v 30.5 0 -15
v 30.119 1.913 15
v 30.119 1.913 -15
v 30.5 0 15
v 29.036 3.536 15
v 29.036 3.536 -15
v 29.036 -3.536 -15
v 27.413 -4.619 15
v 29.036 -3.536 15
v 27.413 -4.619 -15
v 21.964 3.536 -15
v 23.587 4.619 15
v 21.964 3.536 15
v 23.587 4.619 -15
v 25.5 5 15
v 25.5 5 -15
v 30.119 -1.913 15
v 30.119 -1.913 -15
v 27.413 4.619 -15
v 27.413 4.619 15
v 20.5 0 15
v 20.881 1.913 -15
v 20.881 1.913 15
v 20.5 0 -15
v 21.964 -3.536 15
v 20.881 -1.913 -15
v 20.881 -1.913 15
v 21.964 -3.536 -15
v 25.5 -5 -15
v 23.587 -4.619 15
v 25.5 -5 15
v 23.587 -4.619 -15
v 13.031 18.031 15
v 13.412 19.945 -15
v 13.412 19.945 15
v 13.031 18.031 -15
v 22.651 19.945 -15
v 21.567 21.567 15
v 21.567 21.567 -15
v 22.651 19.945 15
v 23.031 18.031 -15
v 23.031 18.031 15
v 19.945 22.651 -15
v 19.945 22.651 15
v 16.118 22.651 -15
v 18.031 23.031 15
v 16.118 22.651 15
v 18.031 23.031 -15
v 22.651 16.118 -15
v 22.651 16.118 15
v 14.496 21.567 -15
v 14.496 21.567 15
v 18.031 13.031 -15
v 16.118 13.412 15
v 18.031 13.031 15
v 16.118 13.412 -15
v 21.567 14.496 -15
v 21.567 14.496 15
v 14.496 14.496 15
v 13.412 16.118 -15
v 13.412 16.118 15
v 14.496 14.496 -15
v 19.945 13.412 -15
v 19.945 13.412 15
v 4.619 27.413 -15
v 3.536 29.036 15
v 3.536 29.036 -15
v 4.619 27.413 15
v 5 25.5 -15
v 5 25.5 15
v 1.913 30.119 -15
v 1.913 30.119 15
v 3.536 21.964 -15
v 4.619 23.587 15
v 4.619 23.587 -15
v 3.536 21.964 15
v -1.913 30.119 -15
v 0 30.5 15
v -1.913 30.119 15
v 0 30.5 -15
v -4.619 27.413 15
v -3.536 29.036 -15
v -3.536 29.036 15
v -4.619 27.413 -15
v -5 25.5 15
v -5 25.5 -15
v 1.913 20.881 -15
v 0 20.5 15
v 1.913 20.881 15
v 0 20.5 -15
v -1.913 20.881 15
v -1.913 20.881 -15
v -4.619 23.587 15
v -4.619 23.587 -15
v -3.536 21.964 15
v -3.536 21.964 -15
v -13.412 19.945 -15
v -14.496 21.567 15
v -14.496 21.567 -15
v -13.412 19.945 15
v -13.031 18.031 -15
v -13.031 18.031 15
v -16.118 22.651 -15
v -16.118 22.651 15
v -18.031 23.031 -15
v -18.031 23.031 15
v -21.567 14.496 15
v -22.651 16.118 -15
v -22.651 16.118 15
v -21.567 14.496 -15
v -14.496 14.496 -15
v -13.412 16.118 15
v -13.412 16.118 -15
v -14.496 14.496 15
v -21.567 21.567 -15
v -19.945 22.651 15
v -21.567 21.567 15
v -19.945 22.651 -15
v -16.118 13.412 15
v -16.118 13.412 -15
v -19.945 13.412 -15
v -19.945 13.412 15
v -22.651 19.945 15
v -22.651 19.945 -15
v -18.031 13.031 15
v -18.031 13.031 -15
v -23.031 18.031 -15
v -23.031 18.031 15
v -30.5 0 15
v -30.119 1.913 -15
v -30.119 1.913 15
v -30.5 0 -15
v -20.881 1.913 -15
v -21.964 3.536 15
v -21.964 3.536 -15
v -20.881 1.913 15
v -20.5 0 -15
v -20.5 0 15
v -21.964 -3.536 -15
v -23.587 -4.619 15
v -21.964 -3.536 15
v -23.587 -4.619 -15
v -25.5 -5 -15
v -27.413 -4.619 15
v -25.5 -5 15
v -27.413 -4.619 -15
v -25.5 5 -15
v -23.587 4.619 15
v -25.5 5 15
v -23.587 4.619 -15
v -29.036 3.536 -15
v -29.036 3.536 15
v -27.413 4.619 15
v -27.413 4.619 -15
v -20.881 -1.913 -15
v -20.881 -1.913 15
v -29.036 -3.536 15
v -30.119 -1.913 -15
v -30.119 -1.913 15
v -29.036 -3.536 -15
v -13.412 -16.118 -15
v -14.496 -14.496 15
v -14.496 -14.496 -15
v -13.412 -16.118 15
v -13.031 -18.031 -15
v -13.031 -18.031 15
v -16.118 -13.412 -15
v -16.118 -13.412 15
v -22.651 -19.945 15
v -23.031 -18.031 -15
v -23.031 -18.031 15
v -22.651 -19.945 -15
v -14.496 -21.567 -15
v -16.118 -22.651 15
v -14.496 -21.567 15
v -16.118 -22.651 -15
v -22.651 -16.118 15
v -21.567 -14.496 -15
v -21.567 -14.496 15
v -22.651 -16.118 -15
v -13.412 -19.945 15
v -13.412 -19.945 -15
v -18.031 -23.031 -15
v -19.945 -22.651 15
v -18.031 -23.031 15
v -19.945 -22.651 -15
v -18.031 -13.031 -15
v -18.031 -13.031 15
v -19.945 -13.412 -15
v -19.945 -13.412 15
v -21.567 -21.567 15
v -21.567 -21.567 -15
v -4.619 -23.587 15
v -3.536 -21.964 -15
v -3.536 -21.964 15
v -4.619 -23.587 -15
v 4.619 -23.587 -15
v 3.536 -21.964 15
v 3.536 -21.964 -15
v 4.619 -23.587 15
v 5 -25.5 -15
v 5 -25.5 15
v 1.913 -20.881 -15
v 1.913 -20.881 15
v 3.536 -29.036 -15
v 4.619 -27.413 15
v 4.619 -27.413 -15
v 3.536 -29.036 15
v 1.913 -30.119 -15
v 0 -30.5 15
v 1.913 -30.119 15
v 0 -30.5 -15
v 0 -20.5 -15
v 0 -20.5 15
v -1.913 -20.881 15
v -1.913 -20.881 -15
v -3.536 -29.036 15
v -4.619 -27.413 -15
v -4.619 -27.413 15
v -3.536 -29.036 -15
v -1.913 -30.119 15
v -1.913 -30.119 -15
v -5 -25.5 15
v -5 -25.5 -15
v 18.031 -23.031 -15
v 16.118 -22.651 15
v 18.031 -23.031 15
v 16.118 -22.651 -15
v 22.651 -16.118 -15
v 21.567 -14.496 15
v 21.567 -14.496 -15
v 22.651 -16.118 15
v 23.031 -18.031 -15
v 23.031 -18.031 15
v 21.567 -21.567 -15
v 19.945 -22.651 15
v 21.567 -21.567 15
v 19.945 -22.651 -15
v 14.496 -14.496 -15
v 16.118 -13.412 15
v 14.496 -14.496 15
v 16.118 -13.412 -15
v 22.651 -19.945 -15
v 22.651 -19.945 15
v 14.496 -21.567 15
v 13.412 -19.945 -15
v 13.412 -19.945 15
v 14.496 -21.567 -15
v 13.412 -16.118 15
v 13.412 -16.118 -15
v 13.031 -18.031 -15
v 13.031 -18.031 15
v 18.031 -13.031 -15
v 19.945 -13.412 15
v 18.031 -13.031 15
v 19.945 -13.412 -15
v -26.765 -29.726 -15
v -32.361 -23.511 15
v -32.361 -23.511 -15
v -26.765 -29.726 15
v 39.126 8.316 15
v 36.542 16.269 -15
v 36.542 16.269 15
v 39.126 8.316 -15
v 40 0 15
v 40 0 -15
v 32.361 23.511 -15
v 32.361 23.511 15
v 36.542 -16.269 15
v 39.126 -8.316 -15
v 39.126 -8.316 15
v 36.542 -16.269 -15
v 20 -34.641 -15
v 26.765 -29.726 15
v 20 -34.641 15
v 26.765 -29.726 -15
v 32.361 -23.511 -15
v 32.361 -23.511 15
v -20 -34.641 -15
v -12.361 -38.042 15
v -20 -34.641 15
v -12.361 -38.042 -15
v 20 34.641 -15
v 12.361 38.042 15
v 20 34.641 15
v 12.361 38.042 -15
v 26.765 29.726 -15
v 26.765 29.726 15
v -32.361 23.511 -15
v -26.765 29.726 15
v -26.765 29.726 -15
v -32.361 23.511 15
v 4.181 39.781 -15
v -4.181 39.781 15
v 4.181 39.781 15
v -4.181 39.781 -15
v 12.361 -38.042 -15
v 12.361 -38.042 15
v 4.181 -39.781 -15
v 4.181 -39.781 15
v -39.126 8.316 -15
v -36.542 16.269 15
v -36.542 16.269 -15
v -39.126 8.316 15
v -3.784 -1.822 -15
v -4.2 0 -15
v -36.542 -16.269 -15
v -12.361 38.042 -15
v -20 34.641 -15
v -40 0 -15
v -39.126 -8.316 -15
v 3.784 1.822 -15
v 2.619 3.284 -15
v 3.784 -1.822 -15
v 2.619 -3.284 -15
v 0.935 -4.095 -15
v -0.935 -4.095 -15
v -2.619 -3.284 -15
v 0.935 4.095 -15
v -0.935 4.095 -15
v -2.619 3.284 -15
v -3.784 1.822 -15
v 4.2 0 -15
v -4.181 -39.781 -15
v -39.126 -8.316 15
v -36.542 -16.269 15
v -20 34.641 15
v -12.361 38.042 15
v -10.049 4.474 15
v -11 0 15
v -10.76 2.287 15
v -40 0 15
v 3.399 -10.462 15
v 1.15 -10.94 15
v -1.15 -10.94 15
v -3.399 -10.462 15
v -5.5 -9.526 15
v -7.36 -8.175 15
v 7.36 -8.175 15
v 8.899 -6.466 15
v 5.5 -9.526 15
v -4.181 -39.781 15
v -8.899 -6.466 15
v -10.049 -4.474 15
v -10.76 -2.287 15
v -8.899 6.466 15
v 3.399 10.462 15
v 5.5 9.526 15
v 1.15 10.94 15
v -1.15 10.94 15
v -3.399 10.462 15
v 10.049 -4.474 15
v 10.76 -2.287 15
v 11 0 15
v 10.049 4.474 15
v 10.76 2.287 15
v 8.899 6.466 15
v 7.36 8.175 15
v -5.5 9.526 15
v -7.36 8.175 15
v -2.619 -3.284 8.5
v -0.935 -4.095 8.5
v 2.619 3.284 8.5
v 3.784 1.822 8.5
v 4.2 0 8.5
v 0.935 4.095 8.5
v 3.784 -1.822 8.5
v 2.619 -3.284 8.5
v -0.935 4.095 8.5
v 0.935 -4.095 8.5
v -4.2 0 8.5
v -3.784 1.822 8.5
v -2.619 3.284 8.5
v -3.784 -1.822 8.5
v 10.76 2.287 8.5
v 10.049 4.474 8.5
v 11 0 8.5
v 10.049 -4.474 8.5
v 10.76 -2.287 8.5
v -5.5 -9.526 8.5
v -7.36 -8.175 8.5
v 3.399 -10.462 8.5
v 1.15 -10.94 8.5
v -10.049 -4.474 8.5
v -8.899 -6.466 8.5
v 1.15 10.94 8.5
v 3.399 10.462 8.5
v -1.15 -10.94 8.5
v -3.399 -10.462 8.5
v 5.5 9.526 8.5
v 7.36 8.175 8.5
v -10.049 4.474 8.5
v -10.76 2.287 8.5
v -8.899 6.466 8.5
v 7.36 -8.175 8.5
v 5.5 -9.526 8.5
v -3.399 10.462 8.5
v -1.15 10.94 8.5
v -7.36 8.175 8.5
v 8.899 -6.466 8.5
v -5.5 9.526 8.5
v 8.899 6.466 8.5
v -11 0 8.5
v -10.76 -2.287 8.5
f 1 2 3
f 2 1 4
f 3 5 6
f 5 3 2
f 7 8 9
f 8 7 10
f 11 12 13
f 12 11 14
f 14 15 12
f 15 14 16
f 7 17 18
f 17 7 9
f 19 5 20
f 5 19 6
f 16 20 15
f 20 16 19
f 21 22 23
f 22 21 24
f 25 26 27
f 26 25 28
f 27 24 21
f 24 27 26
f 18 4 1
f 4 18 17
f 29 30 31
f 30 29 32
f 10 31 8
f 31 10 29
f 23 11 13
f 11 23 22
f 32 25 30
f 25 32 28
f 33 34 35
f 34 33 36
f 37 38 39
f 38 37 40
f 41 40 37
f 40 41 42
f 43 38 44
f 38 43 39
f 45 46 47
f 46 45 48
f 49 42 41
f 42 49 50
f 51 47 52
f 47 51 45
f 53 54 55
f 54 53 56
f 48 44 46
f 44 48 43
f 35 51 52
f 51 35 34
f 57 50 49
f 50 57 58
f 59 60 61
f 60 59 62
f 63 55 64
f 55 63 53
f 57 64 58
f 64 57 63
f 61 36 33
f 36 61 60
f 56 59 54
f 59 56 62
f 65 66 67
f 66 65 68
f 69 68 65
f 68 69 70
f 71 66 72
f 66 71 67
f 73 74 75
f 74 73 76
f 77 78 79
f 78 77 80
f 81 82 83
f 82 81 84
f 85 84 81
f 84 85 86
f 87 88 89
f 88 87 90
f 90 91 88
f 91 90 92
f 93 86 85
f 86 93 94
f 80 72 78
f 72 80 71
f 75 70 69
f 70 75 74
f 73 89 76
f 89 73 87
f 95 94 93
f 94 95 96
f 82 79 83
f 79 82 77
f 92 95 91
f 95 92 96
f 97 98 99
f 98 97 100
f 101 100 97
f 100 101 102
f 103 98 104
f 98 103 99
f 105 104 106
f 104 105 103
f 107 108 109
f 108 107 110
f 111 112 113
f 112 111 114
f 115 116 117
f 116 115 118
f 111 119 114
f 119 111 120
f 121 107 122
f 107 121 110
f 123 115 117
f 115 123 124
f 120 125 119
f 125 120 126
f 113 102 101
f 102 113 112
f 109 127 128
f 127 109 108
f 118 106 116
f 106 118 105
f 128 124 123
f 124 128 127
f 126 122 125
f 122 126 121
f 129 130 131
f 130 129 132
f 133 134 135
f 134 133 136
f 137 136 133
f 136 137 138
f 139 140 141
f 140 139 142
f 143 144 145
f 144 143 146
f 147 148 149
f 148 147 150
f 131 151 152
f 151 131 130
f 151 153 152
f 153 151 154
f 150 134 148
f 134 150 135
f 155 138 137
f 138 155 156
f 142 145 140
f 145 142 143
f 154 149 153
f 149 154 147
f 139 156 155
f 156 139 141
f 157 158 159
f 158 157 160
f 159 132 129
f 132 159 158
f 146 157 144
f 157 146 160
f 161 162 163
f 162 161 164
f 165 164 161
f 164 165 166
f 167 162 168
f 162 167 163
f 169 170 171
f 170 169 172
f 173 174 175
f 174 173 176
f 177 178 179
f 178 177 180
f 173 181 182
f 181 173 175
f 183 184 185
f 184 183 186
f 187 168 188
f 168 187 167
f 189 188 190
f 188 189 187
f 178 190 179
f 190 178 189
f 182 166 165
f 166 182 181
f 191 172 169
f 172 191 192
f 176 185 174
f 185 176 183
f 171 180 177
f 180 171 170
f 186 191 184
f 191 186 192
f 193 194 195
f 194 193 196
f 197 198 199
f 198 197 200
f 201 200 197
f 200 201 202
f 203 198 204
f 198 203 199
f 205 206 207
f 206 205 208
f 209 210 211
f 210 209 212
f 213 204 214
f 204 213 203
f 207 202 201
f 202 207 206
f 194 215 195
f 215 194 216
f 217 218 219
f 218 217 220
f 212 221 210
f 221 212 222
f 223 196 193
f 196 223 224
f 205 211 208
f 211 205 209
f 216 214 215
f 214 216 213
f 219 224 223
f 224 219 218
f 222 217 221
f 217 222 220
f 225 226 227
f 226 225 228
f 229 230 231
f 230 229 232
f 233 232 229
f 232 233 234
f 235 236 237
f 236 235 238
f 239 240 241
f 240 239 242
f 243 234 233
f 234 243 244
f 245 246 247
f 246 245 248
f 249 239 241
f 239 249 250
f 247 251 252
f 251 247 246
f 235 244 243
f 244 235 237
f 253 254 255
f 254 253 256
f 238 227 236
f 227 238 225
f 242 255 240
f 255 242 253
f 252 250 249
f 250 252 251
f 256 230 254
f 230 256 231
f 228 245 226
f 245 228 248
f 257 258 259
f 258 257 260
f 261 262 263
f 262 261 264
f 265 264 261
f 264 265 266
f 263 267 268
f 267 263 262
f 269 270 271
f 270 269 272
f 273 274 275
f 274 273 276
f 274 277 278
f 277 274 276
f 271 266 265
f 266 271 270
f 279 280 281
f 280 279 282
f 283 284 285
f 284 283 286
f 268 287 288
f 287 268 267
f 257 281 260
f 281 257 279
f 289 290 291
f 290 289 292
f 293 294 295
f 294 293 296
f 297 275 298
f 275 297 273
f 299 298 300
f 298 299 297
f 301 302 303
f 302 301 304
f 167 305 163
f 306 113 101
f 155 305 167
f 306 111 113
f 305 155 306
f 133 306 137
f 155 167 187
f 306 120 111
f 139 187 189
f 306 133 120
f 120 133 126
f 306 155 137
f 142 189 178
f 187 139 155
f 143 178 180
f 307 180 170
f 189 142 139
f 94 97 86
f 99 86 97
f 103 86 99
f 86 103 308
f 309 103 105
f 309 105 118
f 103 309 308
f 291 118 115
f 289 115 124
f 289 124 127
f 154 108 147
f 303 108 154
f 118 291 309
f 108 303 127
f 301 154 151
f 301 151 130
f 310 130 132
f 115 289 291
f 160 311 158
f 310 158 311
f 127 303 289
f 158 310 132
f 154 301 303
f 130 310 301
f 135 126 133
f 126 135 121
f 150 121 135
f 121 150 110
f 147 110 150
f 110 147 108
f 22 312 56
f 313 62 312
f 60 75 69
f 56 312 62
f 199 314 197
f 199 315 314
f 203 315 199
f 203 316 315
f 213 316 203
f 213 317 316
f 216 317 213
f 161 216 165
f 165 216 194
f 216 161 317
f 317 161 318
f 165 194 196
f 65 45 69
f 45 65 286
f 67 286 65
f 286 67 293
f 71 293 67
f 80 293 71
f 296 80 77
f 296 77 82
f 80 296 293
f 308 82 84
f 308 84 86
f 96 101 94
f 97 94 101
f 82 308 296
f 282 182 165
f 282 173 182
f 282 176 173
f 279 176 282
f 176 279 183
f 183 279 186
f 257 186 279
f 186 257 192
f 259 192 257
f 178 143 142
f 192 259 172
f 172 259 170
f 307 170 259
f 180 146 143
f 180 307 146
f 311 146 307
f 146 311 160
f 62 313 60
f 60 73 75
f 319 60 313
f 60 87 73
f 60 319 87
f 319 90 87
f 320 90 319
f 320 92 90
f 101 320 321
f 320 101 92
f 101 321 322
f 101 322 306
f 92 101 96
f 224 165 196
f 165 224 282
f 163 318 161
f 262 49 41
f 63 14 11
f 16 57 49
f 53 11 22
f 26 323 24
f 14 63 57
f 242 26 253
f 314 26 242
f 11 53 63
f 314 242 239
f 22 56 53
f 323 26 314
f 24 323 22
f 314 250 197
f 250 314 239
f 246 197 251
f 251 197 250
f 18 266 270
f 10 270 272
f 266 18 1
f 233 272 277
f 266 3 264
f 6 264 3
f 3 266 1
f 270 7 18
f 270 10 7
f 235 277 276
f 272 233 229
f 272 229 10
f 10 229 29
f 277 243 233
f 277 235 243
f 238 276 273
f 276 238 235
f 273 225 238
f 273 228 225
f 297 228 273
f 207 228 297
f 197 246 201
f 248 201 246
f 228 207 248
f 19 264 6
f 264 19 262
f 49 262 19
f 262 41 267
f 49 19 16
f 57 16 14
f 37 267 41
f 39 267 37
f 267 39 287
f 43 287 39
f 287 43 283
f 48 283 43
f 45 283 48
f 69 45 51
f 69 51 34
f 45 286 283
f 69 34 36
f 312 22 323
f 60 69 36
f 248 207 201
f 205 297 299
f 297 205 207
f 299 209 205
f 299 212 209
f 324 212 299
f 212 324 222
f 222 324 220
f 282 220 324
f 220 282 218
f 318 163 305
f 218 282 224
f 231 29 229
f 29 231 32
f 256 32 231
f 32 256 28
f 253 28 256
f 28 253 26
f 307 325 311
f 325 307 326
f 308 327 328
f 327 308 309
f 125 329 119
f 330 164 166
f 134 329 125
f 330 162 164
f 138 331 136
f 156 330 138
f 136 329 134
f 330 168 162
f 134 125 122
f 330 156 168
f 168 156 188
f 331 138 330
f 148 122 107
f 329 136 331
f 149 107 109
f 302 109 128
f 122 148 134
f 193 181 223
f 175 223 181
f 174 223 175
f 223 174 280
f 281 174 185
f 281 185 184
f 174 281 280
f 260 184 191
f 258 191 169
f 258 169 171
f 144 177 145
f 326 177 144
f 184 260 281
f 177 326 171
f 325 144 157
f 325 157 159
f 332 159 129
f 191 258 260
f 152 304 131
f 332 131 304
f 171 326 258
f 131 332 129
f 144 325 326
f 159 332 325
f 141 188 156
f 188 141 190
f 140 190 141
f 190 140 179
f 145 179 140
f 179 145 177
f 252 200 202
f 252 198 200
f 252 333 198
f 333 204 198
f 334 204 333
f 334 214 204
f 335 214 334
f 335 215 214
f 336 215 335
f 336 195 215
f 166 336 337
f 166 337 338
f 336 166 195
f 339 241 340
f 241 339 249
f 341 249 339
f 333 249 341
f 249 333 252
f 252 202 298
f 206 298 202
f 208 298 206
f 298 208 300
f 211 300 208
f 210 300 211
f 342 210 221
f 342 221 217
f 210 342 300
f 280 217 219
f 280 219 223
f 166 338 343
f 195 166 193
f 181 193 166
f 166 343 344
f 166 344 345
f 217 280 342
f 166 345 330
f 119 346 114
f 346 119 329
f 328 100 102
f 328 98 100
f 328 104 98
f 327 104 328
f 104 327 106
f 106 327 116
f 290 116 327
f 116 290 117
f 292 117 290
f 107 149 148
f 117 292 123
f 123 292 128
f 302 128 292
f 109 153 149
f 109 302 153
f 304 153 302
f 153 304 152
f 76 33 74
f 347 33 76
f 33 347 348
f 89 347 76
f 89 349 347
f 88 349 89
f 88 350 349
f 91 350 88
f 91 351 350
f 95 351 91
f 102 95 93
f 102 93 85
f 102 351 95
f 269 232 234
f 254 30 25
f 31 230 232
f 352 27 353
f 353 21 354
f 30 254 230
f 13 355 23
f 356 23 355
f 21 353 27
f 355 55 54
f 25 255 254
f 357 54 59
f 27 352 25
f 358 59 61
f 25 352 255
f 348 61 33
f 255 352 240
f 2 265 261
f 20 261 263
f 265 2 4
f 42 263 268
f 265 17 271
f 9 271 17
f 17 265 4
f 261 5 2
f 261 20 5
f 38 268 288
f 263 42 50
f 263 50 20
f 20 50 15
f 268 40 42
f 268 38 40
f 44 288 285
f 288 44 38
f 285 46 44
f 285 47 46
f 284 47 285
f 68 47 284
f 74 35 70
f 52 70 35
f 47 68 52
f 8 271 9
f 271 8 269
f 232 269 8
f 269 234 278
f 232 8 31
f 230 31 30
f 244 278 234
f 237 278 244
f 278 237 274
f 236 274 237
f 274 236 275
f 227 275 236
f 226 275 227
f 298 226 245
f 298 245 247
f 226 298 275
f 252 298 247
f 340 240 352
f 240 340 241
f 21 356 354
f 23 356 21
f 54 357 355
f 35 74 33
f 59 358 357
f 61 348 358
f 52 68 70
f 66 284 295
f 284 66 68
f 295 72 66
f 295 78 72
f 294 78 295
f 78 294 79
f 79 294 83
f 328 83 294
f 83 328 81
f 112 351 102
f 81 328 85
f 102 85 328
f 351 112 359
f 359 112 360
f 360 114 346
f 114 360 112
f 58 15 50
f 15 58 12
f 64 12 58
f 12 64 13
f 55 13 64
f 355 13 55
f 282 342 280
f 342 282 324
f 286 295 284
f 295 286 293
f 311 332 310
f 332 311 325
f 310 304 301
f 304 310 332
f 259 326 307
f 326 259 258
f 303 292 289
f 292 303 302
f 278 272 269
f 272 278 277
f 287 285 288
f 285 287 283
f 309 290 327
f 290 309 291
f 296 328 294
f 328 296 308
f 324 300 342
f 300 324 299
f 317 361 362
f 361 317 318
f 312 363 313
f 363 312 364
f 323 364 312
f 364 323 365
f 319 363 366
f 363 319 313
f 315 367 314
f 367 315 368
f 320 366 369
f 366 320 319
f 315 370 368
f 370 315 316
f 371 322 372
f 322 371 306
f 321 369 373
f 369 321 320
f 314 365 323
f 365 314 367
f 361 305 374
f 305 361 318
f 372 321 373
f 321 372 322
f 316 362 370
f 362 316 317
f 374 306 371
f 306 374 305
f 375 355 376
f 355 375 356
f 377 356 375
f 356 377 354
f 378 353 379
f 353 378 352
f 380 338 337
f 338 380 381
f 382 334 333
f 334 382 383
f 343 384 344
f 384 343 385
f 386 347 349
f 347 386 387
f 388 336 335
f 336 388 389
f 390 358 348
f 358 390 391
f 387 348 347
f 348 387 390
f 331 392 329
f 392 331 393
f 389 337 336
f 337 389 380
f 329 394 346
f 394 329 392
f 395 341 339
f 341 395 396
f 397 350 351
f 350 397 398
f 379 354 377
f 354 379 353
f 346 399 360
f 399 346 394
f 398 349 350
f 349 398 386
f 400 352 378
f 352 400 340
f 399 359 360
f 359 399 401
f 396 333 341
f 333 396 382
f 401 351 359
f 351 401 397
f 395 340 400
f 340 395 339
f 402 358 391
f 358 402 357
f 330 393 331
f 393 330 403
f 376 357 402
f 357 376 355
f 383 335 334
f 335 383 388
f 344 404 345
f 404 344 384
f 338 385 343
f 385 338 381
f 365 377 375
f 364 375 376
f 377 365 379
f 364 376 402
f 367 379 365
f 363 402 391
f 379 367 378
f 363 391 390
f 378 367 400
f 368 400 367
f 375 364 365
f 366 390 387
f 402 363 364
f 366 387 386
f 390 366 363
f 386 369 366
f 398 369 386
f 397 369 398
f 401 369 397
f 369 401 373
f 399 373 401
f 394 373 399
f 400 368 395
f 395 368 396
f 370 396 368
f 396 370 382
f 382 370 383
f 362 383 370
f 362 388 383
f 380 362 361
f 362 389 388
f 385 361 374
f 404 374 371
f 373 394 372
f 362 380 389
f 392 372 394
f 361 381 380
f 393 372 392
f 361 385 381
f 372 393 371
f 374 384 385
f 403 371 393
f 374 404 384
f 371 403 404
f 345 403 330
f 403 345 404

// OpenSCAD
// Creates a cylinder with a hole in the middle for a 608zz bearing
// and various holes around the spokes for reducing plastic usage

spool_center_radius = 40;
spool_center_length = 30;
filler_radius = 5;
bearing_radius = 11;
bearing_height = 8;
filling_center_radius = ((spool_center_radius - bearing_radius)/2) + bearing_radius;
shaft_radius = 4.2;

difference() {
  cylinder(r=spool_center_radius, h=spool_center_length, center=true);

  // shaft bore
  translate([0,0,-1])
     cylinder(r=shaft_radius,h=spool_center_length + 3, center = true);

  // the bearing bore
  translate([0,0,spool_center_length - bearing_height - 1])
    cylinder(r=bearing_radius, h=(spool_center_length - bearing_height) + 3, center = true);


    // now holes at 45-degree angles just to reduce plastic usage
   for (angle = [0:45:360]) 	{
     translate([cos(angle)*filling_center_radius, sin(angle)*filling_center_radius, -1])
       cylinder(r=filler_radius, h = spool_center_length + 3, center = true);
   }
}
